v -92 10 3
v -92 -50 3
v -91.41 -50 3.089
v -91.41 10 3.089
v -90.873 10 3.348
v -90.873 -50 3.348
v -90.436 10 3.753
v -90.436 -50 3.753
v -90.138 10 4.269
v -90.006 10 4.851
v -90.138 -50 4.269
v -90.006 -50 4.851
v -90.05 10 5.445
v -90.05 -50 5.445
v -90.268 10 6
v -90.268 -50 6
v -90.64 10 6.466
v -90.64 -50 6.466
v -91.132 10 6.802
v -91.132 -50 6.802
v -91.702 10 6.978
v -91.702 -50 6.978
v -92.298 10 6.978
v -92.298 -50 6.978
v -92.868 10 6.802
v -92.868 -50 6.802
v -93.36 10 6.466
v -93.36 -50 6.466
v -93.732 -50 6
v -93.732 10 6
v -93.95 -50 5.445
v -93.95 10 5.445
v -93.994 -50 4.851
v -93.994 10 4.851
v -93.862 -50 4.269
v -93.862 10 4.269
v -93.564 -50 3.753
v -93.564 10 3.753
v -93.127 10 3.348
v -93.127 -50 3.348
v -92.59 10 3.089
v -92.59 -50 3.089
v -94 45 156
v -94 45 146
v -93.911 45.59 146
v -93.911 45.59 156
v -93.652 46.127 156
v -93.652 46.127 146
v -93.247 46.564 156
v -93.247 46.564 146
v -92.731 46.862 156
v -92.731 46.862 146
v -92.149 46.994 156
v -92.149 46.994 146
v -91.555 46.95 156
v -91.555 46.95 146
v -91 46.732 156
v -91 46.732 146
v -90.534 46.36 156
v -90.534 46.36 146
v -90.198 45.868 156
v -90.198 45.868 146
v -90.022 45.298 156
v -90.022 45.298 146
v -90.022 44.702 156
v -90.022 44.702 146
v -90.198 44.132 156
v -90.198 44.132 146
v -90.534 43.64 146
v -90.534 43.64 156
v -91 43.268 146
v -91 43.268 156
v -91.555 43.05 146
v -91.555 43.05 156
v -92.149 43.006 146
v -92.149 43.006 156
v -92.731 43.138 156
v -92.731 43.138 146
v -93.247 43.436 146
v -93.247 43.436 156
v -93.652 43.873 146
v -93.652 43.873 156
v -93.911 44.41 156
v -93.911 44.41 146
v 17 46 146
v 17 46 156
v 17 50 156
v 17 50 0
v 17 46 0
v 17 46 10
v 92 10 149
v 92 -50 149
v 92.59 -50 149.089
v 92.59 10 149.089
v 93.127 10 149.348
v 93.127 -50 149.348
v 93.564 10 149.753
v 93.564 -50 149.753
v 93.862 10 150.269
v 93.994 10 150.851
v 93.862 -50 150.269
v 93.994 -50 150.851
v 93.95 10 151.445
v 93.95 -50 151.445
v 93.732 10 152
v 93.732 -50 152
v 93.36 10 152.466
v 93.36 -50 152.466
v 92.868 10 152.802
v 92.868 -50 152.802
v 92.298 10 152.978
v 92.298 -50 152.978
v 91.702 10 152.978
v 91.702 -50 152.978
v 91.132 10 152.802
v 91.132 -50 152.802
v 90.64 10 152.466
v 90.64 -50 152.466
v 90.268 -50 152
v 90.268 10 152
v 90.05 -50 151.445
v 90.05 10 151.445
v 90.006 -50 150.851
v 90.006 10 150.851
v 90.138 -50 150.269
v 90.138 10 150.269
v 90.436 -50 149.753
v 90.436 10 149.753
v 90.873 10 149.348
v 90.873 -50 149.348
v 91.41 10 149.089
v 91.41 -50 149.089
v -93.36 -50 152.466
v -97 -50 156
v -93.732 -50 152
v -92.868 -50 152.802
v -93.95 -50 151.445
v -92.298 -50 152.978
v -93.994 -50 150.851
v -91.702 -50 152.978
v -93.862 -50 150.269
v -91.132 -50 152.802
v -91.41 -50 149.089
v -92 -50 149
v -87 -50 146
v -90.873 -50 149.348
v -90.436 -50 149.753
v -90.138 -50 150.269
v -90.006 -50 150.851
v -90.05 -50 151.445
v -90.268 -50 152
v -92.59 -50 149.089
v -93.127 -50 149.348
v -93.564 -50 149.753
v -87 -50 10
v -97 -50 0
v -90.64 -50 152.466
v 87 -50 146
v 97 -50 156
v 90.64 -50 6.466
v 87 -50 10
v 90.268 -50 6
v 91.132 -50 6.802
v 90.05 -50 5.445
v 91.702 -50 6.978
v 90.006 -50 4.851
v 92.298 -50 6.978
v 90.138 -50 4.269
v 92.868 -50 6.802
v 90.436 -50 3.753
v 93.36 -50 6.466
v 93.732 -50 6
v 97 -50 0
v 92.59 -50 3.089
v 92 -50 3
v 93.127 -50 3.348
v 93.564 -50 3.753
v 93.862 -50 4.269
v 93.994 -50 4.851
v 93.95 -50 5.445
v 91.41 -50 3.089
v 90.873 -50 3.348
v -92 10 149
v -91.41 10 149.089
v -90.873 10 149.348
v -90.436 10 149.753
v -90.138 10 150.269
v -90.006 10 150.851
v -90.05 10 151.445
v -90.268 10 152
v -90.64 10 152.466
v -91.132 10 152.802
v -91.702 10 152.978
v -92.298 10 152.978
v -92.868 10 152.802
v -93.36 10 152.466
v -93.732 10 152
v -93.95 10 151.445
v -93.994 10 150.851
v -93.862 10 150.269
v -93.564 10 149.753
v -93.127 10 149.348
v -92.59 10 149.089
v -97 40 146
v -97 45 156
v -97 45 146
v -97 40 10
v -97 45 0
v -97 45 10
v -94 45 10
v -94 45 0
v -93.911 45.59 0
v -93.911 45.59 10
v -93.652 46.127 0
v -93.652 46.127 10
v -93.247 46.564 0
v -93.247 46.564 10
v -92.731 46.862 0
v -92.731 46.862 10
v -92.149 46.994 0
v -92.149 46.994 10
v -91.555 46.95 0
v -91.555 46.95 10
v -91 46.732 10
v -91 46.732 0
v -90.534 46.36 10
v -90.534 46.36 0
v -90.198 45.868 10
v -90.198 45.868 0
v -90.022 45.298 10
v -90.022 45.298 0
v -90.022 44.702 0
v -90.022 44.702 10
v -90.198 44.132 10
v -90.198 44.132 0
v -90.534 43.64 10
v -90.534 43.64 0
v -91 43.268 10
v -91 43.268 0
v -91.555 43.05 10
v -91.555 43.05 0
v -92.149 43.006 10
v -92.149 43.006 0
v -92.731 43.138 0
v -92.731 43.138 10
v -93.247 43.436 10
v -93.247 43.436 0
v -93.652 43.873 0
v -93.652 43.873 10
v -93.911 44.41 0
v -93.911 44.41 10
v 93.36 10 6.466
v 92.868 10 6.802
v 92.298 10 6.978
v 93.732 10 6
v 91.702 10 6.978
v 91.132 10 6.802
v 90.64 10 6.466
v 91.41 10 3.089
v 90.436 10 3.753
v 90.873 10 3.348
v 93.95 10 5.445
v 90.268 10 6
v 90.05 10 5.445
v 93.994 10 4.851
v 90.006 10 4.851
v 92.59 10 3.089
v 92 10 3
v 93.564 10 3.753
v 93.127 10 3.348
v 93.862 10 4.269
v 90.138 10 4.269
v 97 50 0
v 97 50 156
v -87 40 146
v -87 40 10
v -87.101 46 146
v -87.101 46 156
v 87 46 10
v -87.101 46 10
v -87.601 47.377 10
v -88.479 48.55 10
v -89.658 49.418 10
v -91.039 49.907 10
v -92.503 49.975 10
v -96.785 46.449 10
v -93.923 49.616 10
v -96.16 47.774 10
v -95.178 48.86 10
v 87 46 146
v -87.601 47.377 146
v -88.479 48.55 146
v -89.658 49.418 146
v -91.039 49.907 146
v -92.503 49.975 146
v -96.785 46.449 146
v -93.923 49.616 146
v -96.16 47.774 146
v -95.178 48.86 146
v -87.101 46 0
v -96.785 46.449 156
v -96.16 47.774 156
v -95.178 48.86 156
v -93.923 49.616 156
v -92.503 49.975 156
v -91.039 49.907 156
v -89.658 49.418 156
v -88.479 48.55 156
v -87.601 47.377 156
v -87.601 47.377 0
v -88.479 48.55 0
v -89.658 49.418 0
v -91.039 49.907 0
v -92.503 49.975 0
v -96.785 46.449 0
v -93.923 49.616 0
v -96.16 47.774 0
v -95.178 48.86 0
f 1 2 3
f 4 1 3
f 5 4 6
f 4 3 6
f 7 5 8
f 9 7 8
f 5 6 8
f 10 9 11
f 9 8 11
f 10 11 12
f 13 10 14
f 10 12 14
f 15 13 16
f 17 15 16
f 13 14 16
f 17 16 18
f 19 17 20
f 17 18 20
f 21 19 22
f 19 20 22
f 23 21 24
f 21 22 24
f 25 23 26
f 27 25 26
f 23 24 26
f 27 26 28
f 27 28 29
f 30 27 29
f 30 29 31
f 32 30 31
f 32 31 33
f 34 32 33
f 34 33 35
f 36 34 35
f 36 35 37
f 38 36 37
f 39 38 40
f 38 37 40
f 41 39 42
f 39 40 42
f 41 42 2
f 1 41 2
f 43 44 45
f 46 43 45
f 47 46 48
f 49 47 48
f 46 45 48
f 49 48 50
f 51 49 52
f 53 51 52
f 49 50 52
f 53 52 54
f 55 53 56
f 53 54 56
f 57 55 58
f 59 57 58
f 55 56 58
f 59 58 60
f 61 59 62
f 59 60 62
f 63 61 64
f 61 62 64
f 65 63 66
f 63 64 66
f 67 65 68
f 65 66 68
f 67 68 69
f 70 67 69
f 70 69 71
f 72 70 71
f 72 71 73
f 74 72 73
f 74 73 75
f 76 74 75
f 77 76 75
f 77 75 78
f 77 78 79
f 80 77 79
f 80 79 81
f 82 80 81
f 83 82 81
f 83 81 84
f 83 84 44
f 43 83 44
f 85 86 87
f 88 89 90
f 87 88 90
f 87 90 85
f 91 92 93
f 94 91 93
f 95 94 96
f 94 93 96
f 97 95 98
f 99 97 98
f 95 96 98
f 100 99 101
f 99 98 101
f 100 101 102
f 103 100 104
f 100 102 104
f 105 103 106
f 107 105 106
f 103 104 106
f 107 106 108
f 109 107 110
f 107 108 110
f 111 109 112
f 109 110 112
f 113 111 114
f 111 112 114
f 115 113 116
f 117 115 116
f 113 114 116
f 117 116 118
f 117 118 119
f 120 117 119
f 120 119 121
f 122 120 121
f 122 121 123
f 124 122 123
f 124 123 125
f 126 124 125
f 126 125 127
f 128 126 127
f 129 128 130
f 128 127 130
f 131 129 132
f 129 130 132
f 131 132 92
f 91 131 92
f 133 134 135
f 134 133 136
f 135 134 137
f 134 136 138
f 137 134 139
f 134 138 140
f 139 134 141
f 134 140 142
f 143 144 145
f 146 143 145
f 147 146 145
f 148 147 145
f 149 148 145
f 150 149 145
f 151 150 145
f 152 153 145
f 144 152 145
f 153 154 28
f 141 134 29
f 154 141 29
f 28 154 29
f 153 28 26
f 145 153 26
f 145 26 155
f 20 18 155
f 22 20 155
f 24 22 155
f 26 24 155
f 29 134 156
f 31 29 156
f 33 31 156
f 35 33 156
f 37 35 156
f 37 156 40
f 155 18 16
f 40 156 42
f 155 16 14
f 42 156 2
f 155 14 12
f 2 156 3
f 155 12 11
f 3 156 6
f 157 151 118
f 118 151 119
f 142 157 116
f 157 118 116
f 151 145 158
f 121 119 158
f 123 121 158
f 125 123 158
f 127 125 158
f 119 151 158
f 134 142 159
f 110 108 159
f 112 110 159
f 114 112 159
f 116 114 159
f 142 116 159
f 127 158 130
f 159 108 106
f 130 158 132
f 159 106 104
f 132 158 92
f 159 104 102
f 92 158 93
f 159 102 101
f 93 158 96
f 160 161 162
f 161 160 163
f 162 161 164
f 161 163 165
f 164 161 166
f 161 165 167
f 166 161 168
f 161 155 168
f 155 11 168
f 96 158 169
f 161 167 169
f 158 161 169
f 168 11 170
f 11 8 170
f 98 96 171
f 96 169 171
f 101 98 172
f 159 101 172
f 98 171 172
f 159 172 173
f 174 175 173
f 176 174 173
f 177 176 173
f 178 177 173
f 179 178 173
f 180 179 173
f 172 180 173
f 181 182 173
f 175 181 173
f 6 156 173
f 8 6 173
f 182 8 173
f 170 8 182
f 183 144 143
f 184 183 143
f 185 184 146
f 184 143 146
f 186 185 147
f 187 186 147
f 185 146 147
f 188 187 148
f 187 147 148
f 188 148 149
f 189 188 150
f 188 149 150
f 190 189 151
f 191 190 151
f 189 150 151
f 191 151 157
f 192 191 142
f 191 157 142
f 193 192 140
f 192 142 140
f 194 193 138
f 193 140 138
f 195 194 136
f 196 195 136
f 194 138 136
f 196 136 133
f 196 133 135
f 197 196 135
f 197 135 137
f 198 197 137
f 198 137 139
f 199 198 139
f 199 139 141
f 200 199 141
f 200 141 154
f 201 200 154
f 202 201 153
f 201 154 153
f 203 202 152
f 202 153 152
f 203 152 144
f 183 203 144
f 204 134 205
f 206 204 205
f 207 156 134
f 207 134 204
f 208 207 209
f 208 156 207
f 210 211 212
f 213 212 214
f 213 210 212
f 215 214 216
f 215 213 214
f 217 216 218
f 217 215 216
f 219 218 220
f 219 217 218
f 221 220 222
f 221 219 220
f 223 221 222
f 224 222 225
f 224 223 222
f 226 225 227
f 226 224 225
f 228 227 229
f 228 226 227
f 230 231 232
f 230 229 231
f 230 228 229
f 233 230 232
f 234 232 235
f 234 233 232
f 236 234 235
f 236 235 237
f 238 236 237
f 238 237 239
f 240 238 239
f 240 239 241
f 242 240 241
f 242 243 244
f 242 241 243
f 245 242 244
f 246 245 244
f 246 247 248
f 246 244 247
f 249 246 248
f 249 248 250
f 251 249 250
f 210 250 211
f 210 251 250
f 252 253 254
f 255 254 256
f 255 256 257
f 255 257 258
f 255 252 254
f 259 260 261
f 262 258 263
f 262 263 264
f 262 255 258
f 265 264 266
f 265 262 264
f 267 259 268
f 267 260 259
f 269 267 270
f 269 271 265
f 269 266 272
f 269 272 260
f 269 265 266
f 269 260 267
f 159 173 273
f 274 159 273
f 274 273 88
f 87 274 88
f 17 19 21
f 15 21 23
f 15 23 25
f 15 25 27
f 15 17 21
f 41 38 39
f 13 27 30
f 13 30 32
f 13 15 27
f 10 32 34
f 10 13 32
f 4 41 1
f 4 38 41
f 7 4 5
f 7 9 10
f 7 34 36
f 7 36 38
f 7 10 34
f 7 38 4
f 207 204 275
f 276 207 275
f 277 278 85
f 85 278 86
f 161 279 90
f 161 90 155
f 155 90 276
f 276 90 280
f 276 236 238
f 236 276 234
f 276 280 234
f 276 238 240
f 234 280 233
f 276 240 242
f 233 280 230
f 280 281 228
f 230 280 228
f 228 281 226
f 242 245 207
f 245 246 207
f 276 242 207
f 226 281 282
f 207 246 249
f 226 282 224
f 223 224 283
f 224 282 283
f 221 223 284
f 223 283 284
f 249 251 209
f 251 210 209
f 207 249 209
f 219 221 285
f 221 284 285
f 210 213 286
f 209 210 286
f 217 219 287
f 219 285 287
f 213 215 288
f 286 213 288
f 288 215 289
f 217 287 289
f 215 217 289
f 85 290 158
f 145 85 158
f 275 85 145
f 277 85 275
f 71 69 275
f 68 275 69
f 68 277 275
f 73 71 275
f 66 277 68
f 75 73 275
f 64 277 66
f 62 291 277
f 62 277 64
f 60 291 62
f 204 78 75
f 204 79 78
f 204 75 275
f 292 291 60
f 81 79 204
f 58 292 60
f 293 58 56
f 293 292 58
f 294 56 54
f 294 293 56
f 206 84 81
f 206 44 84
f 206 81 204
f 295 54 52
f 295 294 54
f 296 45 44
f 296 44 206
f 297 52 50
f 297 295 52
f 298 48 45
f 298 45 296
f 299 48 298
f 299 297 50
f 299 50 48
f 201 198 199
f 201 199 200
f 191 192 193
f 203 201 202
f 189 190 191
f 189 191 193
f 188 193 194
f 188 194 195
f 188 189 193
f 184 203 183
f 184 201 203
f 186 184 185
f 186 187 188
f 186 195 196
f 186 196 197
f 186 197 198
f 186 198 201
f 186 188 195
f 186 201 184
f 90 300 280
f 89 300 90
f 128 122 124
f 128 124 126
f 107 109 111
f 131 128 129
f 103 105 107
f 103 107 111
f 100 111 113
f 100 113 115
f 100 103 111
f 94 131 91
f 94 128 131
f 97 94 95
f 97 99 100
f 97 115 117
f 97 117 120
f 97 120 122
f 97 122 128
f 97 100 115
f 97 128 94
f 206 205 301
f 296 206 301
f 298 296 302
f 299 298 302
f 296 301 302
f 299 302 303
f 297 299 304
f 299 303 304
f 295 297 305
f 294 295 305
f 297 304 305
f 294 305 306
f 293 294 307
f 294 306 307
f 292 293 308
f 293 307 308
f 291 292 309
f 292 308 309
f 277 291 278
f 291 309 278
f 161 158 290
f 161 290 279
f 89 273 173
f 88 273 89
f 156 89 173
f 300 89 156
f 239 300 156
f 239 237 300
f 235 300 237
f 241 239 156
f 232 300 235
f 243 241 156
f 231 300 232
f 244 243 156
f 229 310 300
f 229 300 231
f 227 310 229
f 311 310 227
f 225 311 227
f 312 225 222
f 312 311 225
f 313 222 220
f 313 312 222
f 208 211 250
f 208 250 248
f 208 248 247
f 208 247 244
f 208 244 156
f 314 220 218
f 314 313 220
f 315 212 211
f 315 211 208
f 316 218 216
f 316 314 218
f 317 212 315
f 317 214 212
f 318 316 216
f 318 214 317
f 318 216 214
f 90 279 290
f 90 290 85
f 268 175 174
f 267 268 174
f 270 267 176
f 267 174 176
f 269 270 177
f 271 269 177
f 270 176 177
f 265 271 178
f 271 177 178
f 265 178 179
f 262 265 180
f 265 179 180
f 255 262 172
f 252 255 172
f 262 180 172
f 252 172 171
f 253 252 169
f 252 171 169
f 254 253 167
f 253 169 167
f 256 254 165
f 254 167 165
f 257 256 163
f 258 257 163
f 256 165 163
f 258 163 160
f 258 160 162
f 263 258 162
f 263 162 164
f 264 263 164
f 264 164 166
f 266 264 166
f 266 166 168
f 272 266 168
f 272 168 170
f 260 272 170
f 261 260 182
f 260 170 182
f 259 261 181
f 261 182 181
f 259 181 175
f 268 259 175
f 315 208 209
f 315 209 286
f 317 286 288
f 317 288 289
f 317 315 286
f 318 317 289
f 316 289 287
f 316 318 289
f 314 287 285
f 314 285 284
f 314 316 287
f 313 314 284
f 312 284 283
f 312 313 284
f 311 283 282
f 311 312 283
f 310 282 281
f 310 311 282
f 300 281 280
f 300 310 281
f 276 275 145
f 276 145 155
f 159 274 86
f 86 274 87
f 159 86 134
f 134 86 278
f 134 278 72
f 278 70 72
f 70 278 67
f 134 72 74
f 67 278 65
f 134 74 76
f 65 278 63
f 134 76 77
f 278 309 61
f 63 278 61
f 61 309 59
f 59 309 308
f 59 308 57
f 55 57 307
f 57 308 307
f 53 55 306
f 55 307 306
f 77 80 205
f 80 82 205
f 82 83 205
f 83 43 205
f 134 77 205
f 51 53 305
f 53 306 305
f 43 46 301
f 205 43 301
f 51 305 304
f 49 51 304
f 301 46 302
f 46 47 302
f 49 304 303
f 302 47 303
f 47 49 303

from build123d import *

# Parameters (mm, degrees)
SKETCH1_W               = 80
SKETCH1_H               = 5
BOSS_EXTRUDE1_DEPTH     = 156
SKETCH2_W               = 174
SKETCH2_H               = 136
CUT_EXTRUDE1_DEPTH      = 96
SKETCH3_W               = 94
SKETCH3_H               = 136
CUT_EXTRUDE2_DEPTH      = 96
SKETCH6_W               = 10
SKETCH6_H               = 5
CUT_EXTRUDE3_DEPTH      = 136
CUT_EXTRUDE4_DEPTH      = 183.277261336
CUT_EXTRUDE4_DEPTH_BACK = 183.277261336
SKETCH7_W               = 114
SKETCH7_H               = 4
CUT_EXTRUDE9_REACH      = 192.381
BOSS_EXTRUDE2_DEPTH     = 10
SKETCH10_R              = 2
CUT_EXTRUDE10_DEPTH     = 96
SKETCH12_R              = 2
CUT_EXTRUDE11_DEPTH     = 60


with BuildPart() as part:
    # Sketch1 → Boss-Extrude1 (new body)
    with BuildSketch(Plane.XY):
        Polygon((-97, 50), (-97, -50), (97, -50), (97, 45), (17, 45), (17, 50), align=None)
        with Locations((57, 47.5)):
            Rectangle(SKETCH1_W, SKETCH1_H)
    extrude(amount=BOSS_EXTRUDE1_DEPTH)

    # Sketch2 → Cut-Extrude1 (cut)
    with BuildSketch(Plane(origin=(0, -50, 0), x_dir=(-1, 0, 0), z_dir=(0, -1, 0))):
        with Locations((0, -78)):
            Rectangle(SKETCH2_W, SKETCH2_H)
    extrude(amount=-CUT_EXTRUDE1_DEPTH, mode=Mode.SUBTRACT)

    # Sketch3 → Cut-Extrude2 (cut)
    with BuildSketch(Plane(origin=(0, 50, 0), x_dir=(1, 0, 0), z_dir=(0, 1, 0))):
        with Locations((-40, -78)):
            Rectangle(SKETCH3_W, SKETCH3_H)
    extrude(amount=-CUT_EXTRUDE2_DEPTH, mode=Mode.SUBTRACT)

    # Sketch6 → Cut-Extrude3 (cut)
    with BuildSketch(Plane.XY.offset(10)):
        with Locations((12, 47.5)):
            Rectangle(SKETCH6_W, SKETCH6_H)
    extrude(amount=CUT_EXTRUDE3_DEPTH, mode=Mode.SUBTRACT)

    # Sketch7 → Cut-Extrude4 (cut, two sides: drawn at the far end of the back side and taken through both)
    with BuildSketch(Plane.XY.offset(10).offset(-CUT_EXTRUDE4_DEPTH_BACK)):
        with Locations((-40, 48)):
            Rectangle(SKETCH7_W, SKETCH7_H)
    extrude(amount=CUT_EXTRUDE4_DEPTH + CUT_EXTRUDE4_DEPTH_BACK, mode=Mode.SUBTRACT)

    # Cut-Extrude9: up to this face of the body (flat: up to its plane)
    cut_extrude9_end = Plane(part.part.faces().sort_by_distance((0.962837838, -1.155405405, 156))[0])
    # Sketch8 → Cut-Extrude9 (cut, up to the picked face)
    with BuildSketch(Plane.XY, mode=Mode.PRIVATE) as cut_extrude9_sk1:
        Polygon((-97, 46), (-97, 45), (-97, 40), (-92, 40), (-87, 40), (-87, 46), align=None)
    cut_extrude9_tool1 = split(extrude(cut_extrude9_sk1.sketch, amount=CUT_EXTRUDE9_REACH, mode=Mode.PRIVATE), bisect_by=cut_extrude9_end, keep=Keep.BOTH, mode=Mode.PRIVATE)
    add(cut_extrude9_tool1.solids().sort_by(Axis((-92, 43, 0), (0, 0, 1)))[0], mode=Mode.SUBTRACT)

    # Sketch9 → Boss-Extrude2 (add)
    with BuildSketch(Plane.XY.offset(156)):
        with BuildLine():
            Line((-97, 40), (-97, 45))
            ThreePointArc((-97, 45), (-92.50254481, 49.974680765), (-87.101020514, 46))
            Line((-87.101020514, 46), (-87, 46))
            Line((-87, 46), (-87, 45))
            Line((-87, 45), (-87, 40))
            Line((-87, 40), (-97, 40))
        make_face()
    boss_extrude2 = extrude(amount=-BOSS_EXTRUDE2_DEPTH)

    # Sketch10 → Cut-Extrude10 (cut)
    with BuildSketch(Plane(origin=(0, 0, 146), x_dir=(-1, 0, 0), z_dir=(0, 0, -1))):
        with Locations((92, 45)):
            Circle(SKETCH10_R)
    cut_extrude10 = extrude(amount=-CUT_EXTRUDE10_DEPTH, mode=Mode.SUBTRACT)

    # Mirror1: Boss-Extrude2, Cut-Extrude10 across plane
    add(boss_extrude2.mirror(Plane.XY.offset(78)))
    add(cut_extrude10.mirror(Plane.XY.offset(78)), mode=Mode.SUBTRACT)

    # Sketch12 → Cut-Extrude11 (cut)
    with BuildSketch(Plane(origin=(0, -50, 0), x_dir=(-1, 0, 0), z_dir=(0, -1, 0))):
        with Locations(Location((92, -151, 0), (0, 0, 90))):
            Circle(SKETCH12_R)
        with Locations(Location((-92, -151, 0), (0, 0, 90))):
            Circle(SKETCH12_R)
        with Locations(Location((-92, -5, 0), (0, 0, 90))):
            Circle(SKETCH12_R)
        with Locations(Location((92, -5, 0), (0, 0, 90))):
            Circle(SKETCH12_R)
    extrude(amount=-CUT_EXTRUDE11_DEPTH, mode=Mode.SUBTRACT)


solid = part.part
